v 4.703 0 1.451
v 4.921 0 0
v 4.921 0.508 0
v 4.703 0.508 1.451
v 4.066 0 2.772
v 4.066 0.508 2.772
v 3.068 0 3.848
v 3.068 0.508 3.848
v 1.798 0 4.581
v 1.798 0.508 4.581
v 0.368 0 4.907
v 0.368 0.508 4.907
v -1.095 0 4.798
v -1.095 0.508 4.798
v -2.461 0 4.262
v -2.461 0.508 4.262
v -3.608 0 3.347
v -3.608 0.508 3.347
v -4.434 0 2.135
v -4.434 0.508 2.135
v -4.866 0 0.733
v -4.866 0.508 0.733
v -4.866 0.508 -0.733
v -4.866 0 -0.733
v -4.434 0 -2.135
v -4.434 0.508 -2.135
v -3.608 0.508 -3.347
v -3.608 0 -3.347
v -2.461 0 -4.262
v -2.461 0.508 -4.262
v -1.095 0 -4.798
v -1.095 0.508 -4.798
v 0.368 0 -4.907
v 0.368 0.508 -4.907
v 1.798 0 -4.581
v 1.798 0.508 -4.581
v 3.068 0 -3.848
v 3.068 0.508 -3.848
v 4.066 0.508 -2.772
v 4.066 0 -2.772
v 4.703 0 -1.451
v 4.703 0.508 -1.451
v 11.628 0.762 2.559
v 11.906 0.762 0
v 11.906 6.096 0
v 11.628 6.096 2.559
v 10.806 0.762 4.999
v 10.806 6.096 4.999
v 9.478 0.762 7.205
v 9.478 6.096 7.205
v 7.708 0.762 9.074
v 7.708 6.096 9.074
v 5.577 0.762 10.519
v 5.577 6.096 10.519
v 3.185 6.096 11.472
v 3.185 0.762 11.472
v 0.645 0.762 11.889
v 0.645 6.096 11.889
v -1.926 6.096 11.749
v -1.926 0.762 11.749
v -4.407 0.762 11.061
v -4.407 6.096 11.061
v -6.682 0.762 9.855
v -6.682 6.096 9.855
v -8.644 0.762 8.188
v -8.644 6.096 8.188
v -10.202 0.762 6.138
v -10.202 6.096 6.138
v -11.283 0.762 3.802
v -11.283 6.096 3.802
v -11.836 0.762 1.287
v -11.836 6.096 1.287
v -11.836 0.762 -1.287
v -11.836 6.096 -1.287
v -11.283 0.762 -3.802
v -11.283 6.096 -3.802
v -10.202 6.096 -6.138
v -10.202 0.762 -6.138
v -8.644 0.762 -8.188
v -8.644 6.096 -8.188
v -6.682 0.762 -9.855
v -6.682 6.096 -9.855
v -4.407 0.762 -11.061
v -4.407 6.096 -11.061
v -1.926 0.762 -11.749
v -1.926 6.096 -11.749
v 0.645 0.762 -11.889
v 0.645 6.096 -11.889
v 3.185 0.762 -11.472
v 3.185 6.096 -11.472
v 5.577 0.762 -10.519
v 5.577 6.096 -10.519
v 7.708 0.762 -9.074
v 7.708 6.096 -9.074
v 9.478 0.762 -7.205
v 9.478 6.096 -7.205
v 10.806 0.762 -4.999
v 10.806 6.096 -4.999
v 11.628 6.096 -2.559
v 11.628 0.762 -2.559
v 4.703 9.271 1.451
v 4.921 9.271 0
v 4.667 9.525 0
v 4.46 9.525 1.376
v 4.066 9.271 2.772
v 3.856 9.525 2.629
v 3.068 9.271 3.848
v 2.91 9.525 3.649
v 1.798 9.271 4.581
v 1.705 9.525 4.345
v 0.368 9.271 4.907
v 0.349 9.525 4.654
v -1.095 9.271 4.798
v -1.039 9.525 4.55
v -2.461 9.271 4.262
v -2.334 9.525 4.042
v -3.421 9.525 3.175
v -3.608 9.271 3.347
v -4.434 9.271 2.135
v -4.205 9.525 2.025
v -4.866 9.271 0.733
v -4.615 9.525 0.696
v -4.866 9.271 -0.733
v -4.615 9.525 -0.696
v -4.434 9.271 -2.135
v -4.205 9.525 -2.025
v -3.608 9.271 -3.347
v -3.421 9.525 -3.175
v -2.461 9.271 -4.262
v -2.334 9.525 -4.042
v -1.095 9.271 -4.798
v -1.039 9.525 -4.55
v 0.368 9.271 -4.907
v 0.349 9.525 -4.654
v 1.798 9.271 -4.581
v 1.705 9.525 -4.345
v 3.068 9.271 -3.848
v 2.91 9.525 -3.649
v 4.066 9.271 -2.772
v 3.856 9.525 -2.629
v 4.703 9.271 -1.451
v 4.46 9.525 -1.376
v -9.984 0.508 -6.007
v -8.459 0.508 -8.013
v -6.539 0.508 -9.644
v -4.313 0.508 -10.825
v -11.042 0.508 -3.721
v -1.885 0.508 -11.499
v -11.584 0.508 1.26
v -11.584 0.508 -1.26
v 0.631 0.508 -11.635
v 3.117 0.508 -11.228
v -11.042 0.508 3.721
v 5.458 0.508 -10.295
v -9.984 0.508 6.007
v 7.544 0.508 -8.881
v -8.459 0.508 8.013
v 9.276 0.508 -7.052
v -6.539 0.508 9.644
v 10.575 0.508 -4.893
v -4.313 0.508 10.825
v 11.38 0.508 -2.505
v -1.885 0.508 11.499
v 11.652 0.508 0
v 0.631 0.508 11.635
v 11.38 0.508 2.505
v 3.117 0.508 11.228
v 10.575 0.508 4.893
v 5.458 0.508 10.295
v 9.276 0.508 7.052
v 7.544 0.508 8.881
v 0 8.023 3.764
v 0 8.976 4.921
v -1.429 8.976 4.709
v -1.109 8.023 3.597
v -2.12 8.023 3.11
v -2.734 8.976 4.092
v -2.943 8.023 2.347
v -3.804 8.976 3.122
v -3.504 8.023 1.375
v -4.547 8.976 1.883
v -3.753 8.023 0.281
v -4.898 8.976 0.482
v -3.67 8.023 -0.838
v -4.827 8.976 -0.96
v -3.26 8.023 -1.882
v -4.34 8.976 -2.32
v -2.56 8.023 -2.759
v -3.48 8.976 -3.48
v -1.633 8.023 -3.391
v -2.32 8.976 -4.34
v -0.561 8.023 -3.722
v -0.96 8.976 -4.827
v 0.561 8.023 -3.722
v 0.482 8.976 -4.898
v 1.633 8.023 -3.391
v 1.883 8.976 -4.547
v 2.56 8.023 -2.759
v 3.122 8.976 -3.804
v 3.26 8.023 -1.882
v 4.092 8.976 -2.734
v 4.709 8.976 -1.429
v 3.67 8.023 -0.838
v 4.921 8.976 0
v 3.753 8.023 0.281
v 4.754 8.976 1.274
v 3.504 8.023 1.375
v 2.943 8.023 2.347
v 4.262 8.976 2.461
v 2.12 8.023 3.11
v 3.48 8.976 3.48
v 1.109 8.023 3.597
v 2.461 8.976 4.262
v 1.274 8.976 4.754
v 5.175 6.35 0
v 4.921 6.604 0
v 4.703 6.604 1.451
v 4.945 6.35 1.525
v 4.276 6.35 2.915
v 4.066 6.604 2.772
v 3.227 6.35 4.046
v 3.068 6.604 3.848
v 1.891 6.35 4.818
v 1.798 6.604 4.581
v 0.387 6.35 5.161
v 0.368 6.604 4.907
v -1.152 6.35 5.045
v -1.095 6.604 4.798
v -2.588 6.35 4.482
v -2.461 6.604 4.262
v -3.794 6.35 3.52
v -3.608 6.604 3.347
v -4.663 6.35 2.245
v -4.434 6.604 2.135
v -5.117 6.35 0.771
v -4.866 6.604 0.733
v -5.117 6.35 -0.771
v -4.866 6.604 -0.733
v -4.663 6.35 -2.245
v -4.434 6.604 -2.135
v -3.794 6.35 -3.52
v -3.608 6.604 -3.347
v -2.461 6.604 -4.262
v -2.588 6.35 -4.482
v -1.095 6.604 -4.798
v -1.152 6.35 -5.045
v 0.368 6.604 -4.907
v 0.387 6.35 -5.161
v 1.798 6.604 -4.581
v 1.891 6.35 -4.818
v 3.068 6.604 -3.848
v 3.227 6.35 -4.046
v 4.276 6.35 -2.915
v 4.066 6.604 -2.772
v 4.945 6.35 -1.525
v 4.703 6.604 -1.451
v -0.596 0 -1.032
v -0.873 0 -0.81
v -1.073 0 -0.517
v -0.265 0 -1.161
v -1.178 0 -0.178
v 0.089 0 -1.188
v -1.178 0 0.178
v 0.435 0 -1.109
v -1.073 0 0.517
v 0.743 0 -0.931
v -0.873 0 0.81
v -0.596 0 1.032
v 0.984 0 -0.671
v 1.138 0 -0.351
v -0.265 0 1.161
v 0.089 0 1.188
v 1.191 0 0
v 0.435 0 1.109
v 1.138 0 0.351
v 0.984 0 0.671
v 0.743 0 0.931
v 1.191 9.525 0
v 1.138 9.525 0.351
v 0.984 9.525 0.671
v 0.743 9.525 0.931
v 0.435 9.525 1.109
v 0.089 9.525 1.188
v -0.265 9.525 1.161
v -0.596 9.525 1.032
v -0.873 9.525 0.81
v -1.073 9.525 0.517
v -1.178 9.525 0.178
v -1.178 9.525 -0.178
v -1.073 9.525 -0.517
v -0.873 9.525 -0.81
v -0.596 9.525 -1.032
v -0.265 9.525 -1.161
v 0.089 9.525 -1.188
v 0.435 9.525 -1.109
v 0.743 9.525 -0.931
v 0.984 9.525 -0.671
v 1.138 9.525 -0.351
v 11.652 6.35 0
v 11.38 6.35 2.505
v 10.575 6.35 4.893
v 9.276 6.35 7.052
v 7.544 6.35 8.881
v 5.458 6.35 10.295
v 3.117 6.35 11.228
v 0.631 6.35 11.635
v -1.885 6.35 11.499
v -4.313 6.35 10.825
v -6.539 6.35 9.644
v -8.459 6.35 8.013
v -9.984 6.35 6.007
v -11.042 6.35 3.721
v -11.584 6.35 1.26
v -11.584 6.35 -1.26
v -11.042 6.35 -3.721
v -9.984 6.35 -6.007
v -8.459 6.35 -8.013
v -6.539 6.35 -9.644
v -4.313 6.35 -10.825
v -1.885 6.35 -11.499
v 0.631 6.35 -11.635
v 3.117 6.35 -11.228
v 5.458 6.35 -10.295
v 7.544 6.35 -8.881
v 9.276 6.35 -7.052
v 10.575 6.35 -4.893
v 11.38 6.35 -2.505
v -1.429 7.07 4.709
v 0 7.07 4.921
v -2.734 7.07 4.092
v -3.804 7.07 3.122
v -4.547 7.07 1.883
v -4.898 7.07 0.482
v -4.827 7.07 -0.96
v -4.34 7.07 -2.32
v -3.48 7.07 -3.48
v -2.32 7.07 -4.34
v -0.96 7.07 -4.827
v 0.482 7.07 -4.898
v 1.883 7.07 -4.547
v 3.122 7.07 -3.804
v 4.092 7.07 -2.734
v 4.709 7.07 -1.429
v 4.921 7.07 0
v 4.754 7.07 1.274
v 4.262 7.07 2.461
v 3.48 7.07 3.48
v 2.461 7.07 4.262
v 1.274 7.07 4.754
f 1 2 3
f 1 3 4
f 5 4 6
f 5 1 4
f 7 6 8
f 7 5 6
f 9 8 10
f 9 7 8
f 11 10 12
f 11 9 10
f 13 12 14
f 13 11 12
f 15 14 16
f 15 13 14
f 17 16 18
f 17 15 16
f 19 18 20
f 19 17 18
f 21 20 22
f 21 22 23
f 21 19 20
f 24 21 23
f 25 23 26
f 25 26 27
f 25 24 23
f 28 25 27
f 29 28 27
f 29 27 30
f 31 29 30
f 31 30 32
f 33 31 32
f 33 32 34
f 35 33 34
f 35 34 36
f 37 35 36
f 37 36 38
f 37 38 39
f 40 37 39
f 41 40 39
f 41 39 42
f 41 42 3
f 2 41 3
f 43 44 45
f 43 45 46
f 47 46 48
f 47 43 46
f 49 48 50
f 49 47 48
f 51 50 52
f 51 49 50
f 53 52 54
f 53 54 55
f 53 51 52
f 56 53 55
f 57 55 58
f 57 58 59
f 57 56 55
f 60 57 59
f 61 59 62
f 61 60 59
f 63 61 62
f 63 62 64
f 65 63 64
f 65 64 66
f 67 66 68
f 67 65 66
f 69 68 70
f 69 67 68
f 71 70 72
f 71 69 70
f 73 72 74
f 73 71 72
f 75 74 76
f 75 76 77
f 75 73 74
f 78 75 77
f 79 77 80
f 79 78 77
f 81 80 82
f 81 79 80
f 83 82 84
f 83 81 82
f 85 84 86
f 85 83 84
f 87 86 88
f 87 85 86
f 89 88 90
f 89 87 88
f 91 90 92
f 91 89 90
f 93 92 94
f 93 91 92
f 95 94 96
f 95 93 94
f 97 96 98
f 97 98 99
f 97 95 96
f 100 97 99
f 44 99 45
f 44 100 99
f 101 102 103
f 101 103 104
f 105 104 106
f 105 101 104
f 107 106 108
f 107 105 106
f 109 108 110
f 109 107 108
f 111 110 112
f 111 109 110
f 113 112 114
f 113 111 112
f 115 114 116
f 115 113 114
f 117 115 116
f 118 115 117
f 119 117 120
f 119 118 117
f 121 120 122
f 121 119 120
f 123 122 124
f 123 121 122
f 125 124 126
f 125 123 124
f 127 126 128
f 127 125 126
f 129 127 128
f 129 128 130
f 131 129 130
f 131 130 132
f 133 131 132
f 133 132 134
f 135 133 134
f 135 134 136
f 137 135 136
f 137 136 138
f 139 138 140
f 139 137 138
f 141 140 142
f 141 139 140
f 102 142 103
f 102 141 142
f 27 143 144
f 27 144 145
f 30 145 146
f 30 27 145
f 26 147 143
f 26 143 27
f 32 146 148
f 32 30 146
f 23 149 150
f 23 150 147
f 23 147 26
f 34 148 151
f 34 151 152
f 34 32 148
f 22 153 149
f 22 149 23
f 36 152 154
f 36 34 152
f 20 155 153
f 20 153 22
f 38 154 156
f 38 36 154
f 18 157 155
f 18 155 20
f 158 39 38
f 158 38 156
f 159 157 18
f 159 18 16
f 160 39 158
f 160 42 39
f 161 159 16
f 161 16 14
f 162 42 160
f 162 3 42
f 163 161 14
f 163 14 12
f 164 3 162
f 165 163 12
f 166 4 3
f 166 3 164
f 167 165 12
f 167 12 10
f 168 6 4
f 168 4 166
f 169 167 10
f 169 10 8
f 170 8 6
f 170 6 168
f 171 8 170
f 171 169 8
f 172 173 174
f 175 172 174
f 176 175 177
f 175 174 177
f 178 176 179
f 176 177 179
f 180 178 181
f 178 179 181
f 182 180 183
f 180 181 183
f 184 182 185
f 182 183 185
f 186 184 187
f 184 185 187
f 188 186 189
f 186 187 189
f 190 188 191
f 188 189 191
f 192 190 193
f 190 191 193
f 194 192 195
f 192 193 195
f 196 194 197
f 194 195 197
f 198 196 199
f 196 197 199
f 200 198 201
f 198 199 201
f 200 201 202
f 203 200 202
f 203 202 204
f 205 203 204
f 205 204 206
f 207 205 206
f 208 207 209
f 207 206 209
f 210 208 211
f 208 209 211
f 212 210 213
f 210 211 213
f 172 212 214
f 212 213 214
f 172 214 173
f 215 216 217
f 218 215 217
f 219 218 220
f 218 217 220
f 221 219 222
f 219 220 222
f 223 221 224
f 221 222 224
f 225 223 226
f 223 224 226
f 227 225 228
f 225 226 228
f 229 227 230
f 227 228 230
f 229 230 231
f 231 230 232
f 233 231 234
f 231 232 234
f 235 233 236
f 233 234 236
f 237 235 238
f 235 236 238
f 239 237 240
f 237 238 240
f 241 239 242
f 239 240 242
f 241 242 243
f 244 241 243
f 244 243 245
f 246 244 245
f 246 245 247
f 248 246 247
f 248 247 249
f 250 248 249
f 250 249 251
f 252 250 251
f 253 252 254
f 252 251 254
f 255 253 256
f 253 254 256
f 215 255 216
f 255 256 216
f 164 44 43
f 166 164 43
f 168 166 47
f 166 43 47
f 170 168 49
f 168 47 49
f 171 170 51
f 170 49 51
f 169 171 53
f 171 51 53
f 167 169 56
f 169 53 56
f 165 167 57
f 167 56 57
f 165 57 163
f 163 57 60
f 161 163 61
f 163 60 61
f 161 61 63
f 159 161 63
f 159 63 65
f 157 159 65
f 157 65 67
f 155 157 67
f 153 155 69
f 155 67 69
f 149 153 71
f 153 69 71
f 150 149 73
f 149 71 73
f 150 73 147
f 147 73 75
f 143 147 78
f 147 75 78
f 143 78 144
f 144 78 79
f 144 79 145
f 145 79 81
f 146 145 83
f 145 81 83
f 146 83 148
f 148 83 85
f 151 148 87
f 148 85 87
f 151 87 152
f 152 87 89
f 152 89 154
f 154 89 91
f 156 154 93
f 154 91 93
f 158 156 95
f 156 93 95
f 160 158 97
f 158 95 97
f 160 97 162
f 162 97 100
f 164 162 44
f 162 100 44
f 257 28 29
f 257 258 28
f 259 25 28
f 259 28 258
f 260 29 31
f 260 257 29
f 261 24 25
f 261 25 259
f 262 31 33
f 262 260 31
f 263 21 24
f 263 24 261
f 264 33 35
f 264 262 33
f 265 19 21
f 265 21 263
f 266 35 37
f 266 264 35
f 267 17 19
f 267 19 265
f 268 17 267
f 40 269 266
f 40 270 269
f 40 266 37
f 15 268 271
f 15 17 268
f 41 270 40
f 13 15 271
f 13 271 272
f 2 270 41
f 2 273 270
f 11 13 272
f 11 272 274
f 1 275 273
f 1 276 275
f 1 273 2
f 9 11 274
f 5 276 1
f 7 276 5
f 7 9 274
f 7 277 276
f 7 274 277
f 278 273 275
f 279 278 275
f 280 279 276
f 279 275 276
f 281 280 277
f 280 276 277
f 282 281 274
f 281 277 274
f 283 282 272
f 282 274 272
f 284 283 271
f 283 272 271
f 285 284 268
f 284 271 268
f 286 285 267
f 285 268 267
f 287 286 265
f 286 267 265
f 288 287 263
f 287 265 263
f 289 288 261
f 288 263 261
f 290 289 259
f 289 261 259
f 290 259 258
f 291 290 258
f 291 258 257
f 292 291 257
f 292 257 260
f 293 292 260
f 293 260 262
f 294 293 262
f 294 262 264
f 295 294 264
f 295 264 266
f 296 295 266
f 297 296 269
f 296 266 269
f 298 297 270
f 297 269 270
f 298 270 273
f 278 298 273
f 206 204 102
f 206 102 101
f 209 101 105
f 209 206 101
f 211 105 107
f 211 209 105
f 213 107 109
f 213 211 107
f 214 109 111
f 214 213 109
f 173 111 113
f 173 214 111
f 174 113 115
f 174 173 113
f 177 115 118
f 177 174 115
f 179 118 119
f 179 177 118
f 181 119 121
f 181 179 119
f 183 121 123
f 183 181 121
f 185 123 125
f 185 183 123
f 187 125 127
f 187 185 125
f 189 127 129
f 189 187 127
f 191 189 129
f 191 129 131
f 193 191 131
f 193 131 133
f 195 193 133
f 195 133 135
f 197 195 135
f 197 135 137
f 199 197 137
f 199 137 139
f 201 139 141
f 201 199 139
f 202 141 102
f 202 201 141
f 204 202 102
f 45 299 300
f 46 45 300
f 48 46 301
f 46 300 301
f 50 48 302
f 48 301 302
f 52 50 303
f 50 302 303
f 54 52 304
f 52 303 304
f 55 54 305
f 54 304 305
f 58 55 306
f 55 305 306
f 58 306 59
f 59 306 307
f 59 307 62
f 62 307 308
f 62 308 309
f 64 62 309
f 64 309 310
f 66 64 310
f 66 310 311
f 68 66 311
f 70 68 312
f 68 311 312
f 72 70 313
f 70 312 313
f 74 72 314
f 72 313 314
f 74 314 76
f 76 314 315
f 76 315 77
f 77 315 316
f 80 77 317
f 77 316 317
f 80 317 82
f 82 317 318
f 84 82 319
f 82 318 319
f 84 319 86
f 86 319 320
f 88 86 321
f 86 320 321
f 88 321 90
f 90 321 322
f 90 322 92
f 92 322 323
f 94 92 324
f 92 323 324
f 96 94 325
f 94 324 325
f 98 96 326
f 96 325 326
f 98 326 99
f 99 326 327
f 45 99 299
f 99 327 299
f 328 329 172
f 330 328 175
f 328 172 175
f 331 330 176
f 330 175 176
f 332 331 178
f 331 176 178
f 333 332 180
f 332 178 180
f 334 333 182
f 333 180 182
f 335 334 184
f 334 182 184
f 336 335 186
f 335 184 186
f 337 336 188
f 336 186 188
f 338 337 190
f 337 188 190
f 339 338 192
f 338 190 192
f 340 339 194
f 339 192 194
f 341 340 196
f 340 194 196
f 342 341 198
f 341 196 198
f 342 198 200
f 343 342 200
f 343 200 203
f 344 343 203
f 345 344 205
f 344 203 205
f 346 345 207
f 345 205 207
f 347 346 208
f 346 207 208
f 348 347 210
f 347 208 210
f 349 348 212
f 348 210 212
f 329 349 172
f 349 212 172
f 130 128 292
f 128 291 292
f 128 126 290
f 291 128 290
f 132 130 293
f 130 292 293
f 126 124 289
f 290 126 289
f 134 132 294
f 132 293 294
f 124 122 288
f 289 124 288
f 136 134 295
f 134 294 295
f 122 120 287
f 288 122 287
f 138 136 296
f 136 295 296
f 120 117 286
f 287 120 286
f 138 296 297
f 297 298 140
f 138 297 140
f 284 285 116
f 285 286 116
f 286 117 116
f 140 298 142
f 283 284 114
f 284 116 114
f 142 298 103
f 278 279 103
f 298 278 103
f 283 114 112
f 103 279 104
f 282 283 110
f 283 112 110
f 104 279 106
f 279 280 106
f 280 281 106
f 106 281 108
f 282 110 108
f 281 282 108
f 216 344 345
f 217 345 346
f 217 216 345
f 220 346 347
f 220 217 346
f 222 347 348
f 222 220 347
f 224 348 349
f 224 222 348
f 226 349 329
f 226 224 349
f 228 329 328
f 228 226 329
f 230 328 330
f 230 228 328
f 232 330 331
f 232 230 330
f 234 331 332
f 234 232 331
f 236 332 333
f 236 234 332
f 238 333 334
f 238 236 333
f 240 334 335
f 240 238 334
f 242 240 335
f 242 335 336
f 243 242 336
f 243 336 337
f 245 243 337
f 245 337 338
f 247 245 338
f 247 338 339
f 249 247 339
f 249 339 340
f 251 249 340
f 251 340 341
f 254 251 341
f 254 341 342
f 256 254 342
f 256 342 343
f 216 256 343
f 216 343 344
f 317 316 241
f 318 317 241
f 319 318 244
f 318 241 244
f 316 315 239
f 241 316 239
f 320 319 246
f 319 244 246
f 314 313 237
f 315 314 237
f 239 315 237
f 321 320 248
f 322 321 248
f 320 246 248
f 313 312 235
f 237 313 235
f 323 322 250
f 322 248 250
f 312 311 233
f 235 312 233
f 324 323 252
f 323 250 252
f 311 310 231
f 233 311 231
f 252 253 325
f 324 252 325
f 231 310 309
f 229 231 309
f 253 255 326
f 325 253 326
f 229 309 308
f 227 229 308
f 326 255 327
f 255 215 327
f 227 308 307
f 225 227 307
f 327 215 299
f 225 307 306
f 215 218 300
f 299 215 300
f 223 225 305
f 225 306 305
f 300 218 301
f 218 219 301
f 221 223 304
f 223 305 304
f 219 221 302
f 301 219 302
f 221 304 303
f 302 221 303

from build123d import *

# Parameters (mm, degrees)
F1_START = -0.508
F0_R     = 11.90625
F0_R_2   = 4.92125
F1_DEPTH = 5.842
F0_R_3   = 1.19126
F2_DEPTH = 9.525
F3_SIZE  = 0.254


with BuildPart() as f1:
    # F0 (on Front) → F1 (new body)
    with BuildSketch(Plane.XZ.offset(F1_START)):
        Circle(F0_R)
        Circle(F0_R_2, mode=Mode.SUBTRACT)
    extrude(amount=-F1_DEPTH)

    # F0 (on Front) → F2 (join)
    with BuildSketch(Plane.XZ):
        Circle(F0_R_2)
        Circle(F0_R_3, mode=Mode.SUBTRACT)
    extrude(amount=-F2_DEPTH)

    # F3
    f3_edges = [f1.edges().sort_by_distance(p)[0] for p in [
        (-11.90625, 6.35, 0),
        (-11.90625, 0.508, 0),
        (-4.92125, 9.525, 0),
        (-4.92125, 6.35, 0),
    ]]
    chamfer(f3_edges, length=F3_SIZE)

    # F4 (on Right) → F5 (revolve, cut)
    with BuildSketch(Plane.YZ):
        Polygon((6.5216665858, 5.5874292748), (8.0233332929, 3.7639748771), (9.525, 5.5874292748), align=None)
    revolve(axis=Axis((0, 0, 0), (0, -1, 0)), mode=Mode.SUBTRACT)


solid = f1.part
